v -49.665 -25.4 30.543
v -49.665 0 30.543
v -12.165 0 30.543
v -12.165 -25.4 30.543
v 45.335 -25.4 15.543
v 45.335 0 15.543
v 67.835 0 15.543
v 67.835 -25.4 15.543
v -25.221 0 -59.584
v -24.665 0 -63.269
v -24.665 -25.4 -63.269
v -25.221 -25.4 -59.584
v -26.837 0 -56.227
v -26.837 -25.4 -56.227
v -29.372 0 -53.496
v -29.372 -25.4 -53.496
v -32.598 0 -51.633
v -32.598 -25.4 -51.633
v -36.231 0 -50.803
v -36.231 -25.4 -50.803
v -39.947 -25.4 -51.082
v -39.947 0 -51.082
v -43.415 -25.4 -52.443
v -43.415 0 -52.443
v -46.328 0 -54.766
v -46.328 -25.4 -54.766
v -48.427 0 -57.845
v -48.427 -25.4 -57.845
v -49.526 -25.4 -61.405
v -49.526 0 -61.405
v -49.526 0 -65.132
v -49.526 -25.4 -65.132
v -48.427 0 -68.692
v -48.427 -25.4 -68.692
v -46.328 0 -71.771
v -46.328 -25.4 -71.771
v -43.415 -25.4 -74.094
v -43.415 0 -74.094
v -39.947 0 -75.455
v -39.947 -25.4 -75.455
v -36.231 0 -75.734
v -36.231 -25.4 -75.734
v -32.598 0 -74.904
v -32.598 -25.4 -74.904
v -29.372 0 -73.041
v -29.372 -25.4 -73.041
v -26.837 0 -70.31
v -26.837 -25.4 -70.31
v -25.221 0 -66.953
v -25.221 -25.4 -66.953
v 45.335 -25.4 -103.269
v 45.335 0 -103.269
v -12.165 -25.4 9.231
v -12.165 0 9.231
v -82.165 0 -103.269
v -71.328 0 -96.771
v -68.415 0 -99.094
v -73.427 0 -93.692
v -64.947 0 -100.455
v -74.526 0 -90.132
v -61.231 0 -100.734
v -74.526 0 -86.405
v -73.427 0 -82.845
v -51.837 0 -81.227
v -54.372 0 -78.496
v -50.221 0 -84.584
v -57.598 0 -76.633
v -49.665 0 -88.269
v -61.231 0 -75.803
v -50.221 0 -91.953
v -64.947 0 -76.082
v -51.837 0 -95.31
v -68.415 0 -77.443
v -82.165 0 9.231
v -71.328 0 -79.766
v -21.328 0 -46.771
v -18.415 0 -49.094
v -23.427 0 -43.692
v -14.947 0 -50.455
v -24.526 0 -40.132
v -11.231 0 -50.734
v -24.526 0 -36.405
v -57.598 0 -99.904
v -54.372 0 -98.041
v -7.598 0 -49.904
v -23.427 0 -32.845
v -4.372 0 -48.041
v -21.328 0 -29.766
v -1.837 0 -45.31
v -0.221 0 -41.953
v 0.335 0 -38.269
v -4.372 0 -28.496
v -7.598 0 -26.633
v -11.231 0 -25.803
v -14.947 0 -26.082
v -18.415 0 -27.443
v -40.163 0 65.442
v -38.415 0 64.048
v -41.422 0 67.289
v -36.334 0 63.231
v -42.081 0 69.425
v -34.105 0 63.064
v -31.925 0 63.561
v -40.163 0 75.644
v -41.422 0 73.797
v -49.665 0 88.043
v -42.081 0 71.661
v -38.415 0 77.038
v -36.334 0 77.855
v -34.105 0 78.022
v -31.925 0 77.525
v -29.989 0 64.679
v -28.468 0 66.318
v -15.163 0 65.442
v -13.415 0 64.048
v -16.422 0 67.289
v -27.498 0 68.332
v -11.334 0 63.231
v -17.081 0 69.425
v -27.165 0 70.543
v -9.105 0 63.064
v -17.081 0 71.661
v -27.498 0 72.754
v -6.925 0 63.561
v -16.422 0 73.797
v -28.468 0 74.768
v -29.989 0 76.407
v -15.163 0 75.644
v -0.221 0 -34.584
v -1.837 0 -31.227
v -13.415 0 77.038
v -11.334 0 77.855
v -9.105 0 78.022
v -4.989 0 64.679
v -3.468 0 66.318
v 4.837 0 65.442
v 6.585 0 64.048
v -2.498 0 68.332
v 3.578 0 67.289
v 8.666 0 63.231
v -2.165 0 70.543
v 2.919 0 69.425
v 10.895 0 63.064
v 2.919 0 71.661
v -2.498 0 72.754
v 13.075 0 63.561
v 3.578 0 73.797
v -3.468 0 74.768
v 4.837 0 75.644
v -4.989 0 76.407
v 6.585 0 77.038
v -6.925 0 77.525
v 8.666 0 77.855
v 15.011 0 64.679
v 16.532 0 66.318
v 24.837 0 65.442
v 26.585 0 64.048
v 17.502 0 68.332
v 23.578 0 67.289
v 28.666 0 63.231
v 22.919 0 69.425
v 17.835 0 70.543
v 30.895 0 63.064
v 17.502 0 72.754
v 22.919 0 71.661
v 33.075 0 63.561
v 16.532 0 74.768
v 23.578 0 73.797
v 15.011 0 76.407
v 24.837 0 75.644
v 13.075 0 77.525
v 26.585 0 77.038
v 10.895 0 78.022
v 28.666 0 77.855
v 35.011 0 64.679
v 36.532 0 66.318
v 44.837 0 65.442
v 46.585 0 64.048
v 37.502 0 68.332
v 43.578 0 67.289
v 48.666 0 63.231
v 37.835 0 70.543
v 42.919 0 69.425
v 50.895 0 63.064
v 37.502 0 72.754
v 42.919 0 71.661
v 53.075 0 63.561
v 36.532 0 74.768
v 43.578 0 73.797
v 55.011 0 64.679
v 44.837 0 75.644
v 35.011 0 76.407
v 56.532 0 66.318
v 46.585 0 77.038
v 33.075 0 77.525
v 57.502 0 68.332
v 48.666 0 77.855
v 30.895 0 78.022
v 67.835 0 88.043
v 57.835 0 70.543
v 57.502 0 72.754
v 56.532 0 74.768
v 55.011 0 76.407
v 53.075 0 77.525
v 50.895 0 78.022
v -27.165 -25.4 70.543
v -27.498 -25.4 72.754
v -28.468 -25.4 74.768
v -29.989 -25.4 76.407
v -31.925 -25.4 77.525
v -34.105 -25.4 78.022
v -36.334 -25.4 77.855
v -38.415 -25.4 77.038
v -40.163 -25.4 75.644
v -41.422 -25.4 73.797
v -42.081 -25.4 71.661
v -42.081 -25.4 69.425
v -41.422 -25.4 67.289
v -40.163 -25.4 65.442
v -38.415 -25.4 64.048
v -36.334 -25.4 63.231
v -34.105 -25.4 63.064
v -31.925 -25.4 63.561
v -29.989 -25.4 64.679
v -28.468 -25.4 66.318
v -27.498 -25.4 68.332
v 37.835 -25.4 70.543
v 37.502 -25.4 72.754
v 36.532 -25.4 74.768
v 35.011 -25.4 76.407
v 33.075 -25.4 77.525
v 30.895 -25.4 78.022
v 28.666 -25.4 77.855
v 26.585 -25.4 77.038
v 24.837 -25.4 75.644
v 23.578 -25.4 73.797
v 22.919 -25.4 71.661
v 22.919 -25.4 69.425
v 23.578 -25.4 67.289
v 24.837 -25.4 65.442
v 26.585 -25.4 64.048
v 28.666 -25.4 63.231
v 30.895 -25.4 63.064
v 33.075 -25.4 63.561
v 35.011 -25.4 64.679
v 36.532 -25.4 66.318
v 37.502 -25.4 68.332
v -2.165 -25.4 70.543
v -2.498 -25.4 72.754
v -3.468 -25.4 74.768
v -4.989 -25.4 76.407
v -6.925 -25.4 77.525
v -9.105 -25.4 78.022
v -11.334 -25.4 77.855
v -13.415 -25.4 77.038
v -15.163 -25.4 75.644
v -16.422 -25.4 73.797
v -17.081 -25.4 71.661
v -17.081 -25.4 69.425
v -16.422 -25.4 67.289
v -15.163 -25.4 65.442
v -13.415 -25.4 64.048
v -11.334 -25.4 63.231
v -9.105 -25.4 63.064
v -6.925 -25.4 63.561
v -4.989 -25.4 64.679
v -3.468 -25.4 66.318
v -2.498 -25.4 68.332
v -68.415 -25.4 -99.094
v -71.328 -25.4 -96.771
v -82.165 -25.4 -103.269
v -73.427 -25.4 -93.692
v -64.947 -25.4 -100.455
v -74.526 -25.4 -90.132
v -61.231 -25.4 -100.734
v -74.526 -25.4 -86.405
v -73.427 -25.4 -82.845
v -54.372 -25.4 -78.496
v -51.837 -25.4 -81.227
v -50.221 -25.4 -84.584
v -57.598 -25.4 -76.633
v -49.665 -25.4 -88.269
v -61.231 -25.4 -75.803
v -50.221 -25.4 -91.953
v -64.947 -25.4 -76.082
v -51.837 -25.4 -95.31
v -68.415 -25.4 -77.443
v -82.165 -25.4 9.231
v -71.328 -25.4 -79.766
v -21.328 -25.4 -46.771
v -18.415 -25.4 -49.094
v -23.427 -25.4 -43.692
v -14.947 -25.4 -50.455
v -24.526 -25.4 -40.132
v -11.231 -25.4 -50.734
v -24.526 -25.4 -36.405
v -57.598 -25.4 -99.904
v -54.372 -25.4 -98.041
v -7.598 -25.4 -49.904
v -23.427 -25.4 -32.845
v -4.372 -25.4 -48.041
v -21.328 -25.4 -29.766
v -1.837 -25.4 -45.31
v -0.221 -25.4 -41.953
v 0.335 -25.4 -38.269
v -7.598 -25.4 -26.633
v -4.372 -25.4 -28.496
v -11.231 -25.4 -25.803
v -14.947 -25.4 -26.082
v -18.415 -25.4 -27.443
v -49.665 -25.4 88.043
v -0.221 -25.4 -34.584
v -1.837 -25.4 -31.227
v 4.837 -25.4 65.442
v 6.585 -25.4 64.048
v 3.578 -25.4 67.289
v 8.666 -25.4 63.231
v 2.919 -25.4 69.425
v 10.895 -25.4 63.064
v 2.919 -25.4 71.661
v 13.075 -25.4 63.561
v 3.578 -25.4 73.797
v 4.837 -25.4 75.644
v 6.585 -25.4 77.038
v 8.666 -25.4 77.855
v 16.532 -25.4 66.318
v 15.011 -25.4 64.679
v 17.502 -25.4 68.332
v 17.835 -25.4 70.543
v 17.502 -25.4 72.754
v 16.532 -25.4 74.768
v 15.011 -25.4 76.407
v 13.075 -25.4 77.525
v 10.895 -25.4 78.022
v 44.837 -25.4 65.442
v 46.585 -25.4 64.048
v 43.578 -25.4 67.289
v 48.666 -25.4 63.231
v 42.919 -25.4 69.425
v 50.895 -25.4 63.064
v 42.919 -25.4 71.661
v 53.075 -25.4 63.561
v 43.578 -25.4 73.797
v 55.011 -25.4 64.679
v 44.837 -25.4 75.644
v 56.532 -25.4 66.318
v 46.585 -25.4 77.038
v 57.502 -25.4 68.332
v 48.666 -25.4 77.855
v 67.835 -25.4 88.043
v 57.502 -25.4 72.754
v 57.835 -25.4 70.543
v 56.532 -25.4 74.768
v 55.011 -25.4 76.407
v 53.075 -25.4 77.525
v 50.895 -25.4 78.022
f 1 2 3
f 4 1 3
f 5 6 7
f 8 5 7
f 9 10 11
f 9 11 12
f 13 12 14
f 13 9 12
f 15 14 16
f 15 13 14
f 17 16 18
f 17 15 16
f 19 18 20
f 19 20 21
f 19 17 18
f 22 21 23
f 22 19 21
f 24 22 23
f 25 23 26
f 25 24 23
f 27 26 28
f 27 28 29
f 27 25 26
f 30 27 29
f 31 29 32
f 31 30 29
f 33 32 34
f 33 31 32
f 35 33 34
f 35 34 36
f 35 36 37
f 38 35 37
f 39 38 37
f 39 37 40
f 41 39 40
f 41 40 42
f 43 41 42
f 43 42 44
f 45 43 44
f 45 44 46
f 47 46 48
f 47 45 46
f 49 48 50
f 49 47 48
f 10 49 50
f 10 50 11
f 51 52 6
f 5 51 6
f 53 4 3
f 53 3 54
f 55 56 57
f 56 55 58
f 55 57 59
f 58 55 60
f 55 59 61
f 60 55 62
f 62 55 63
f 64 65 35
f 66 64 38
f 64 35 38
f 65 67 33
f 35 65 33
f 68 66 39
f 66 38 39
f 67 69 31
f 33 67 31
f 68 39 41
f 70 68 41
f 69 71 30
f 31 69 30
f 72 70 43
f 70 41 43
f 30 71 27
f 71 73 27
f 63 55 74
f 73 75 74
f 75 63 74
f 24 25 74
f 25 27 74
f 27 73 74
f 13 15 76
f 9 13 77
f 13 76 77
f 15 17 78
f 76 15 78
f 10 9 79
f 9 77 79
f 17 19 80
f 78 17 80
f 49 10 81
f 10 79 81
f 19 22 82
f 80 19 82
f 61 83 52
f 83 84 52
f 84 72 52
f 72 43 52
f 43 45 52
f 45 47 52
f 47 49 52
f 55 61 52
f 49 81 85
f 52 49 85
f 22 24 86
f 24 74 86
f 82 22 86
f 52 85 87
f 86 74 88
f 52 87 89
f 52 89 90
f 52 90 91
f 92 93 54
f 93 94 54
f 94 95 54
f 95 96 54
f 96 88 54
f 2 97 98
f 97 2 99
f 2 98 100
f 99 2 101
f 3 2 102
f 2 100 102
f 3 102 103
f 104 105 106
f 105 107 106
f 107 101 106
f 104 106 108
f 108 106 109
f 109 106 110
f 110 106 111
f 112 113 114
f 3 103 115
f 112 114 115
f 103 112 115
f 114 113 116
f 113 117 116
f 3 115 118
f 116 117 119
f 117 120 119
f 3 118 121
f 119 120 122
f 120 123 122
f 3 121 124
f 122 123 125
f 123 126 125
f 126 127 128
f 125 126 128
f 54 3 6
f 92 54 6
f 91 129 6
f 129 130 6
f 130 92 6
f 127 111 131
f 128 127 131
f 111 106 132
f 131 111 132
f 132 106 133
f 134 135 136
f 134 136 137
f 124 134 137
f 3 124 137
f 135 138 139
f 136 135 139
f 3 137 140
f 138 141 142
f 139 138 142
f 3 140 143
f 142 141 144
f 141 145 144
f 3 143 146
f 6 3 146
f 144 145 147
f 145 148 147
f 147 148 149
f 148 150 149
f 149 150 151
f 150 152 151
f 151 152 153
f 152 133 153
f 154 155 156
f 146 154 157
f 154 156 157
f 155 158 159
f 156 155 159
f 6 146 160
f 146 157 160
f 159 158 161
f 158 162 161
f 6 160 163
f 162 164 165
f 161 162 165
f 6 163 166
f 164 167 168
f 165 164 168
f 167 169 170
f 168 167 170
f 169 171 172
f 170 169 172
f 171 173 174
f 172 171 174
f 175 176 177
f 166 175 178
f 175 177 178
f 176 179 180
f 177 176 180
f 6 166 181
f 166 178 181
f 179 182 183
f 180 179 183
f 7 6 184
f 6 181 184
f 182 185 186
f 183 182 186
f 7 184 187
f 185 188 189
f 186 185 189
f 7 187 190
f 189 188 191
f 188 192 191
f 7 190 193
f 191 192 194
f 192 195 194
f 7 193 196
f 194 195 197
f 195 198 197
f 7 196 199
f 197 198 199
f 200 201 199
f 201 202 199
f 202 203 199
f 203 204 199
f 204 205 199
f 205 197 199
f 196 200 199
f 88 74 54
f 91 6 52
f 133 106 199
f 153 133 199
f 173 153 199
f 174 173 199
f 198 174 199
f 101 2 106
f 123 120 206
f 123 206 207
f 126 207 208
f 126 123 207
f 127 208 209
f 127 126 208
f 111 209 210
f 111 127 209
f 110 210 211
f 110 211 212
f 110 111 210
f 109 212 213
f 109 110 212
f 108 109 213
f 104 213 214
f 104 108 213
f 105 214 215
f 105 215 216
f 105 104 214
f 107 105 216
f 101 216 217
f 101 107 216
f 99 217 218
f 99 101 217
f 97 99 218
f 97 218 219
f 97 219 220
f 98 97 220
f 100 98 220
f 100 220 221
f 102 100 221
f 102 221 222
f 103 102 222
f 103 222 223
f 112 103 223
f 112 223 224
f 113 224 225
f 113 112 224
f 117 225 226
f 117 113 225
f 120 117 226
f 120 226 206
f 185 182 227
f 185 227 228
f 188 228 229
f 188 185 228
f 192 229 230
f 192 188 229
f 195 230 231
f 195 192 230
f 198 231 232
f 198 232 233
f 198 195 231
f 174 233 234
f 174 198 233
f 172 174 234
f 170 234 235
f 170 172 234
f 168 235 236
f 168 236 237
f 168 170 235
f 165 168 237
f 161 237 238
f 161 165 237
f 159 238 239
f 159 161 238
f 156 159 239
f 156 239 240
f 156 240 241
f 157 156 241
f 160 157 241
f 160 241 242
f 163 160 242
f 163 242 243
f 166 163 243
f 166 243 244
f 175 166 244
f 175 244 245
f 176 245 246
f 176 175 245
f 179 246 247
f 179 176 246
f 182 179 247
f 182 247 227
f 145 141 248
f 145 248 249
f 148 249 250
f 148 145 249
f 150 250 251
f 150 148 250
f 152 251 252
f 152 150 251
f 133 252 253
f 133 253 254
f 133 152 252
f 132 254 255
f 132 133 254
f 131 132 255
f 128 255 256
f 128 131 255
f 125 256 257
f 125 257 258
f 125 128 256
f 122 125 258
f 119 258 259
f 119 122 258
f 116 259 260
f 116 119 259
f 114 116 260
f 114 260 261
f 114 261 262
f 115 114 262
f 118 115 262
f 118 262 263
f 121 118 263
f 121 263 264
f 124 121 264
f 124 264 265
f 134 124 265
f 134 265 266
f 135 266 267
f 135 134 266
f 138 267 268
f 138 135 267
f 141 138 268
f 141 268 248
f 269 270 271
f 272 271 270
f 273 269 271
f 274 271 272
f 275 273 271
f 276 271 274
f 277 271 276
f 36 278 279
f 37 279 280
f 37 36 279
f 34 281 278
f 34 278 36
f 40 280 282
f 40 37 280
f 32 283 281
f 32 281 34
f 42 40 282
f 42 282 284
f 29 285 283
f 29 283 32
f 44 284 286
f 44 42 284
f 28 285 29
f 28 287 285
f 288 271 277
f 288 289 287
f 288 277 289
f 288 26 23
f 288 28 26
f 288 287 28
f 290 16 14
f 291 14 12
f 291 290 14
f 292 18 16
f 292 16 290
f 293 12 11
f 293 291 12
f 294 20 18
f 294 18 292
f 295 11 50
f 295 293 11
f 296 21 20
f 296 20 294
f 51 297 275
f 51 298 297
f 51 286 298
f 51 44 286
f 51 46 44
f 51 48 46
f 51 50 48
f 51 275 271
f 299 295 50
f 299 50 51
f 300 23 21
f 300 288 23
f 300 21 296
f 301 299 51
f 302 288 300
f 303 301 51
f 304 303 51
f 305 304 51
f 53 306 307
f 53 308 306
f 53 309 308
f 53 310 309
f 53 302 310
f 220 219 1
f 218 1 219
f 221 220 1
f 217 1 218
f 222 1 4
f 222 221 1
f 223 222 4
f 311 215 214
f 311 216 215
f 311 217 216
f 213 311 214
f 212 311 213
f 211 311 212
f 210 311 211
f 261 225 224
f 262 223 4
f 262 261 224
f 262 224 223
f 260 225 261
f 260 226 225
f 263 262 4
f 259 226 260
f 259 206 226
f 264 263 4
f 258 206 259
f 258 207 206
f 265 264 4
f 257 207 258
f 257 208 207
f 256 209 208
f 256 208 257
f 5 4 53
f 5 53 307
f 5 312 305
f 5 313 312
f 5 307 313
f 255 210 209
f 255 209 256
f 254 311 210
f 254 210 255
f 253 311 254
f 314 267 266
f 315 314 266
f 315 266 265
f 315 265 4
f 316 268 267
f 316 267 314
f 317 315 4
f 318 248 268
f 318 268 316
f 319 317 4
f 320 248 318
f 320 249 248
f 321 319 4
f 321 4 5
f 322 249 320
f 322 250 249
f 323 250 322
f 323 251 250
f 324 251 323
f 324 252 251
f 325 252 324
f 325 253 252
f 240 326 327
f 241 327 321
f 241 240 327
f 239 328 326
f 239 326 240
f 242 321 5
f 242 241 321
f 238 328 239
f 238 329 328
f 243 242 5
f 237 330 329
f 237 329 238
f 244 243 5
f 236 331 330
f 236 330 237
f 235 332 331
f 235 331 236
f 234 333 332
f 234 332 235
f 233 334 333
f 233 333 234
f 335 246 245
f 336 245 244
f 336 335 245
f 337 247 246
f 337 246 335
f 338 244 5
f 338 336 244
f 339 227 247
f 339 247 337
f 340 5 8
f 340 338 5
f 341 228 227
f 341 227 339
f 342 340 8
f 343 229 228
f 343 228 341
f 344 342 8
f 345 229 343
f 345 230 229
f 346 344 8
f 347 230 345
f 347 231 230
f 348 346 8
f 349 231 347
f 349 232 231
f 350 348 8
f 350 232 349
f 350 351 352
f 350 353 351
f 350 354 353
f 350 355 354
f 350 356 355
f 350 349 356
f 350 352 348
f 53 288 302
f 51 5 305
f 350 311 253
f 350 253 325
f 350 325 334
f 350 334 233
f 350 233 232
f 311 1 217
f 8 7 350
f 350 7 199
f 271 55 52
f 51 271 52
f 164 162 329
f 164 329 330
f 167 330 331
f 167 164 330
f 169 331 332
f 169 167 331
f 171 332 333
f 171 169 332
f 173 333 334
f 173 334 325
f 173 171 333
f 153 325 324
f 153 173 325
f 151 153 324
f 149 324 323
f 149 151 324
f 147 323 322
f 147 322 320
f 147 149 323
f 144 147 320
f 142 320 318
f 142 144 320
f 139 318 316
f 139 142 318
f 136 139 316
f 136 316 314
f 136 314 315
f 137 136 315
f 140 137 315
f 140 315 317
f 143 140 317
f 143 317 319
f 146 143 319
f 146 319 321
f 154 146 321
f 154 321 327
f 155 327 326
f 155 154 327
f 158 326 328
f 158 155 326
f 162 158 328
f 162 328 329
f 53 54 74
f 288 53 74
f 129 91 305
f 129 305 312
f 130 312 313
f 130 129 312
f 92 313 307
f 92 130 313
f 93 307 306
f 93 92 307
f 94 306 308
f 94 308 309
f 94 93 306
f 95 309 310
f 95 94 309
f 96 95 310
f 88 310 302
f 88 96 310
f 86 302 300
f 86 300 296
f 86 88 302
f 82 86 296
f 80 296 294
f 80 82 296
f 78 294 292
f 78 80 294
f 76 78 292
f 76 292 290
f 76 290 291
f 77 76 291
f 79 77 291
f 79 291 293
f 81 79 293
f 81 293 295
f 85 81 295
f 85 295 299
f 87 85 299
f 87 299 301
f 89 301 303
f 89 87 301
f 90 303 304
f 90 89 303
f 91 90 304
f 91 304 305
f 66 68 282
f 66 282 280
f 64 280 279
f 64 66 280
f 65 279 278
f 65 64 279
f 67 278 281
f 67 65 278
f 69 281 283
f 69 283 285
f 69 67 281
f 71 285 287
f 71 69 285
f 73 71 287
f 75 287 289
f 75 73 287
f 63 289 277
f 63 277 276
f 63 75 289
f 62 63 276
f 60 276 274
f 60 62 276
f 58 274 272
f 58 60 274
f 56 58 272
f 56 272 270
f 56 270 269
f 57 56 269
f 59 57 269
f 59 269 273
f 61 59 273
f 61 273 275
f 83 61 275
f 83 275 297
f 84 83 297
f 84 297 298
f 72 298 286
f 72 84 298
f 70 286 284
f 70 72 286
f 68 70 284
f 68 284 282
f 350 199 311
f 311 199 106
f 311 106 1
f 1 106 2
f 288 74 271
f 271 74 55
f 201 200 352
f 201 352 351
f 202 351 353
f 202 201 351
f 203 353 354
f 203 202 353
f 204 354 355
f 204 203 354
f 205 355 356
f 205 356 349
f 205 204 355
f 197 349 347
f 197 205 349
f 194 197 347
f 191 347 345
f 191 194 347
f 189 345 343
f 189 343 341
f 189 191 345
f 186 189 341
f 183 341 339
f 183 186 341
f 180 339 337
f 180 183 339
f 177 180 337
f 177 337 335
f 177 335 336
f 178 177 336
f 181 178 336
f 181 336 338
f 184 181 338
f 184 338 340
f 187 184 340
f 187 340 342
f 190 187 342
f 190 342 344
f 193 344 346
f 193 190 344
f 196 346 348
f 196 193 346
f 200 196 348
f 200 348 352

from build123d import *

# Parameters (mm, degrees)
F0_R     = 7.5
F0_R_2   = 12.5
F1_DEPTH = 25.4


with BuildPart() as f1:
    # F0 (on Front) → F1 (new body)
    with BuildSketch(Plane.XZ):
        Polygon((-12.1652076736, 30.5430293083), (-12.1652076736, 9.2314934358), (45.3347923264, 9.2314934358), (45.3347923264, 15.5430293083), (67.8347923264, 15.5430293083), (67.8347923264, 70.5430293083), (67.8347923264, 88.0430293083), (-49.6652076736, 88.0430293083), (-49.6652076736, 30.5430293083), align=None)
        with Locations((-34.6652076736, 70.5430293083)):
            Circle(F0_R, mode=Mode.SUBTRACT)
        with Locations((-9.6652076736, 70.5430293083)):
            Circle(F0_R, mode=Mode.SUBTRACT)
        with Locations((10.3347923264, 70.5430293083)):
            Circle(F0_R, mode=Mode.SUBTRACT)
        with Locations((30.3347923264, 70.5430293083)):
            Circle(F0_R, mode=Mode.SUBTRACT)
        with Locations((50.3347923264, 70.5430293083)):
            Circle(F0_R, mode=Mode.SUBTRACT)
        Polygon((-12.1652076736, 9.2314934358), (-82.1652076736, 9.2314934358), (-82.1652076736, -38.2685065642), (-82.1652076736, -63.2685065642), (-82.1652076736, -88.2685065642), (-82.1652076736, -103.2685065642), (-62.1652076736, -103.2685065642), (-37.1652076736, -103.2685065642), (-12.1652076736, -103.2685065642), (45.3347923264, -103.2685065642), (45.3347923264, 9.2314934358), align=None)
        with Locations((-62.1652076736, -88.2685065642)):
            Circle(F0_R_2, mode=Mode.SUBTRACT)
        with Locations((-37.1652076736, -63.2685065642)):
            Circle(F0_R_2, mode=Mode.SUBTRACT)
        with Locations((-12.1652076736, -38.2685065642)):
            Circle(F0_R_2, mode=Mode.SUBTRACT)
    extrude(amount=F1_DEPTH)


solid = f1.part
